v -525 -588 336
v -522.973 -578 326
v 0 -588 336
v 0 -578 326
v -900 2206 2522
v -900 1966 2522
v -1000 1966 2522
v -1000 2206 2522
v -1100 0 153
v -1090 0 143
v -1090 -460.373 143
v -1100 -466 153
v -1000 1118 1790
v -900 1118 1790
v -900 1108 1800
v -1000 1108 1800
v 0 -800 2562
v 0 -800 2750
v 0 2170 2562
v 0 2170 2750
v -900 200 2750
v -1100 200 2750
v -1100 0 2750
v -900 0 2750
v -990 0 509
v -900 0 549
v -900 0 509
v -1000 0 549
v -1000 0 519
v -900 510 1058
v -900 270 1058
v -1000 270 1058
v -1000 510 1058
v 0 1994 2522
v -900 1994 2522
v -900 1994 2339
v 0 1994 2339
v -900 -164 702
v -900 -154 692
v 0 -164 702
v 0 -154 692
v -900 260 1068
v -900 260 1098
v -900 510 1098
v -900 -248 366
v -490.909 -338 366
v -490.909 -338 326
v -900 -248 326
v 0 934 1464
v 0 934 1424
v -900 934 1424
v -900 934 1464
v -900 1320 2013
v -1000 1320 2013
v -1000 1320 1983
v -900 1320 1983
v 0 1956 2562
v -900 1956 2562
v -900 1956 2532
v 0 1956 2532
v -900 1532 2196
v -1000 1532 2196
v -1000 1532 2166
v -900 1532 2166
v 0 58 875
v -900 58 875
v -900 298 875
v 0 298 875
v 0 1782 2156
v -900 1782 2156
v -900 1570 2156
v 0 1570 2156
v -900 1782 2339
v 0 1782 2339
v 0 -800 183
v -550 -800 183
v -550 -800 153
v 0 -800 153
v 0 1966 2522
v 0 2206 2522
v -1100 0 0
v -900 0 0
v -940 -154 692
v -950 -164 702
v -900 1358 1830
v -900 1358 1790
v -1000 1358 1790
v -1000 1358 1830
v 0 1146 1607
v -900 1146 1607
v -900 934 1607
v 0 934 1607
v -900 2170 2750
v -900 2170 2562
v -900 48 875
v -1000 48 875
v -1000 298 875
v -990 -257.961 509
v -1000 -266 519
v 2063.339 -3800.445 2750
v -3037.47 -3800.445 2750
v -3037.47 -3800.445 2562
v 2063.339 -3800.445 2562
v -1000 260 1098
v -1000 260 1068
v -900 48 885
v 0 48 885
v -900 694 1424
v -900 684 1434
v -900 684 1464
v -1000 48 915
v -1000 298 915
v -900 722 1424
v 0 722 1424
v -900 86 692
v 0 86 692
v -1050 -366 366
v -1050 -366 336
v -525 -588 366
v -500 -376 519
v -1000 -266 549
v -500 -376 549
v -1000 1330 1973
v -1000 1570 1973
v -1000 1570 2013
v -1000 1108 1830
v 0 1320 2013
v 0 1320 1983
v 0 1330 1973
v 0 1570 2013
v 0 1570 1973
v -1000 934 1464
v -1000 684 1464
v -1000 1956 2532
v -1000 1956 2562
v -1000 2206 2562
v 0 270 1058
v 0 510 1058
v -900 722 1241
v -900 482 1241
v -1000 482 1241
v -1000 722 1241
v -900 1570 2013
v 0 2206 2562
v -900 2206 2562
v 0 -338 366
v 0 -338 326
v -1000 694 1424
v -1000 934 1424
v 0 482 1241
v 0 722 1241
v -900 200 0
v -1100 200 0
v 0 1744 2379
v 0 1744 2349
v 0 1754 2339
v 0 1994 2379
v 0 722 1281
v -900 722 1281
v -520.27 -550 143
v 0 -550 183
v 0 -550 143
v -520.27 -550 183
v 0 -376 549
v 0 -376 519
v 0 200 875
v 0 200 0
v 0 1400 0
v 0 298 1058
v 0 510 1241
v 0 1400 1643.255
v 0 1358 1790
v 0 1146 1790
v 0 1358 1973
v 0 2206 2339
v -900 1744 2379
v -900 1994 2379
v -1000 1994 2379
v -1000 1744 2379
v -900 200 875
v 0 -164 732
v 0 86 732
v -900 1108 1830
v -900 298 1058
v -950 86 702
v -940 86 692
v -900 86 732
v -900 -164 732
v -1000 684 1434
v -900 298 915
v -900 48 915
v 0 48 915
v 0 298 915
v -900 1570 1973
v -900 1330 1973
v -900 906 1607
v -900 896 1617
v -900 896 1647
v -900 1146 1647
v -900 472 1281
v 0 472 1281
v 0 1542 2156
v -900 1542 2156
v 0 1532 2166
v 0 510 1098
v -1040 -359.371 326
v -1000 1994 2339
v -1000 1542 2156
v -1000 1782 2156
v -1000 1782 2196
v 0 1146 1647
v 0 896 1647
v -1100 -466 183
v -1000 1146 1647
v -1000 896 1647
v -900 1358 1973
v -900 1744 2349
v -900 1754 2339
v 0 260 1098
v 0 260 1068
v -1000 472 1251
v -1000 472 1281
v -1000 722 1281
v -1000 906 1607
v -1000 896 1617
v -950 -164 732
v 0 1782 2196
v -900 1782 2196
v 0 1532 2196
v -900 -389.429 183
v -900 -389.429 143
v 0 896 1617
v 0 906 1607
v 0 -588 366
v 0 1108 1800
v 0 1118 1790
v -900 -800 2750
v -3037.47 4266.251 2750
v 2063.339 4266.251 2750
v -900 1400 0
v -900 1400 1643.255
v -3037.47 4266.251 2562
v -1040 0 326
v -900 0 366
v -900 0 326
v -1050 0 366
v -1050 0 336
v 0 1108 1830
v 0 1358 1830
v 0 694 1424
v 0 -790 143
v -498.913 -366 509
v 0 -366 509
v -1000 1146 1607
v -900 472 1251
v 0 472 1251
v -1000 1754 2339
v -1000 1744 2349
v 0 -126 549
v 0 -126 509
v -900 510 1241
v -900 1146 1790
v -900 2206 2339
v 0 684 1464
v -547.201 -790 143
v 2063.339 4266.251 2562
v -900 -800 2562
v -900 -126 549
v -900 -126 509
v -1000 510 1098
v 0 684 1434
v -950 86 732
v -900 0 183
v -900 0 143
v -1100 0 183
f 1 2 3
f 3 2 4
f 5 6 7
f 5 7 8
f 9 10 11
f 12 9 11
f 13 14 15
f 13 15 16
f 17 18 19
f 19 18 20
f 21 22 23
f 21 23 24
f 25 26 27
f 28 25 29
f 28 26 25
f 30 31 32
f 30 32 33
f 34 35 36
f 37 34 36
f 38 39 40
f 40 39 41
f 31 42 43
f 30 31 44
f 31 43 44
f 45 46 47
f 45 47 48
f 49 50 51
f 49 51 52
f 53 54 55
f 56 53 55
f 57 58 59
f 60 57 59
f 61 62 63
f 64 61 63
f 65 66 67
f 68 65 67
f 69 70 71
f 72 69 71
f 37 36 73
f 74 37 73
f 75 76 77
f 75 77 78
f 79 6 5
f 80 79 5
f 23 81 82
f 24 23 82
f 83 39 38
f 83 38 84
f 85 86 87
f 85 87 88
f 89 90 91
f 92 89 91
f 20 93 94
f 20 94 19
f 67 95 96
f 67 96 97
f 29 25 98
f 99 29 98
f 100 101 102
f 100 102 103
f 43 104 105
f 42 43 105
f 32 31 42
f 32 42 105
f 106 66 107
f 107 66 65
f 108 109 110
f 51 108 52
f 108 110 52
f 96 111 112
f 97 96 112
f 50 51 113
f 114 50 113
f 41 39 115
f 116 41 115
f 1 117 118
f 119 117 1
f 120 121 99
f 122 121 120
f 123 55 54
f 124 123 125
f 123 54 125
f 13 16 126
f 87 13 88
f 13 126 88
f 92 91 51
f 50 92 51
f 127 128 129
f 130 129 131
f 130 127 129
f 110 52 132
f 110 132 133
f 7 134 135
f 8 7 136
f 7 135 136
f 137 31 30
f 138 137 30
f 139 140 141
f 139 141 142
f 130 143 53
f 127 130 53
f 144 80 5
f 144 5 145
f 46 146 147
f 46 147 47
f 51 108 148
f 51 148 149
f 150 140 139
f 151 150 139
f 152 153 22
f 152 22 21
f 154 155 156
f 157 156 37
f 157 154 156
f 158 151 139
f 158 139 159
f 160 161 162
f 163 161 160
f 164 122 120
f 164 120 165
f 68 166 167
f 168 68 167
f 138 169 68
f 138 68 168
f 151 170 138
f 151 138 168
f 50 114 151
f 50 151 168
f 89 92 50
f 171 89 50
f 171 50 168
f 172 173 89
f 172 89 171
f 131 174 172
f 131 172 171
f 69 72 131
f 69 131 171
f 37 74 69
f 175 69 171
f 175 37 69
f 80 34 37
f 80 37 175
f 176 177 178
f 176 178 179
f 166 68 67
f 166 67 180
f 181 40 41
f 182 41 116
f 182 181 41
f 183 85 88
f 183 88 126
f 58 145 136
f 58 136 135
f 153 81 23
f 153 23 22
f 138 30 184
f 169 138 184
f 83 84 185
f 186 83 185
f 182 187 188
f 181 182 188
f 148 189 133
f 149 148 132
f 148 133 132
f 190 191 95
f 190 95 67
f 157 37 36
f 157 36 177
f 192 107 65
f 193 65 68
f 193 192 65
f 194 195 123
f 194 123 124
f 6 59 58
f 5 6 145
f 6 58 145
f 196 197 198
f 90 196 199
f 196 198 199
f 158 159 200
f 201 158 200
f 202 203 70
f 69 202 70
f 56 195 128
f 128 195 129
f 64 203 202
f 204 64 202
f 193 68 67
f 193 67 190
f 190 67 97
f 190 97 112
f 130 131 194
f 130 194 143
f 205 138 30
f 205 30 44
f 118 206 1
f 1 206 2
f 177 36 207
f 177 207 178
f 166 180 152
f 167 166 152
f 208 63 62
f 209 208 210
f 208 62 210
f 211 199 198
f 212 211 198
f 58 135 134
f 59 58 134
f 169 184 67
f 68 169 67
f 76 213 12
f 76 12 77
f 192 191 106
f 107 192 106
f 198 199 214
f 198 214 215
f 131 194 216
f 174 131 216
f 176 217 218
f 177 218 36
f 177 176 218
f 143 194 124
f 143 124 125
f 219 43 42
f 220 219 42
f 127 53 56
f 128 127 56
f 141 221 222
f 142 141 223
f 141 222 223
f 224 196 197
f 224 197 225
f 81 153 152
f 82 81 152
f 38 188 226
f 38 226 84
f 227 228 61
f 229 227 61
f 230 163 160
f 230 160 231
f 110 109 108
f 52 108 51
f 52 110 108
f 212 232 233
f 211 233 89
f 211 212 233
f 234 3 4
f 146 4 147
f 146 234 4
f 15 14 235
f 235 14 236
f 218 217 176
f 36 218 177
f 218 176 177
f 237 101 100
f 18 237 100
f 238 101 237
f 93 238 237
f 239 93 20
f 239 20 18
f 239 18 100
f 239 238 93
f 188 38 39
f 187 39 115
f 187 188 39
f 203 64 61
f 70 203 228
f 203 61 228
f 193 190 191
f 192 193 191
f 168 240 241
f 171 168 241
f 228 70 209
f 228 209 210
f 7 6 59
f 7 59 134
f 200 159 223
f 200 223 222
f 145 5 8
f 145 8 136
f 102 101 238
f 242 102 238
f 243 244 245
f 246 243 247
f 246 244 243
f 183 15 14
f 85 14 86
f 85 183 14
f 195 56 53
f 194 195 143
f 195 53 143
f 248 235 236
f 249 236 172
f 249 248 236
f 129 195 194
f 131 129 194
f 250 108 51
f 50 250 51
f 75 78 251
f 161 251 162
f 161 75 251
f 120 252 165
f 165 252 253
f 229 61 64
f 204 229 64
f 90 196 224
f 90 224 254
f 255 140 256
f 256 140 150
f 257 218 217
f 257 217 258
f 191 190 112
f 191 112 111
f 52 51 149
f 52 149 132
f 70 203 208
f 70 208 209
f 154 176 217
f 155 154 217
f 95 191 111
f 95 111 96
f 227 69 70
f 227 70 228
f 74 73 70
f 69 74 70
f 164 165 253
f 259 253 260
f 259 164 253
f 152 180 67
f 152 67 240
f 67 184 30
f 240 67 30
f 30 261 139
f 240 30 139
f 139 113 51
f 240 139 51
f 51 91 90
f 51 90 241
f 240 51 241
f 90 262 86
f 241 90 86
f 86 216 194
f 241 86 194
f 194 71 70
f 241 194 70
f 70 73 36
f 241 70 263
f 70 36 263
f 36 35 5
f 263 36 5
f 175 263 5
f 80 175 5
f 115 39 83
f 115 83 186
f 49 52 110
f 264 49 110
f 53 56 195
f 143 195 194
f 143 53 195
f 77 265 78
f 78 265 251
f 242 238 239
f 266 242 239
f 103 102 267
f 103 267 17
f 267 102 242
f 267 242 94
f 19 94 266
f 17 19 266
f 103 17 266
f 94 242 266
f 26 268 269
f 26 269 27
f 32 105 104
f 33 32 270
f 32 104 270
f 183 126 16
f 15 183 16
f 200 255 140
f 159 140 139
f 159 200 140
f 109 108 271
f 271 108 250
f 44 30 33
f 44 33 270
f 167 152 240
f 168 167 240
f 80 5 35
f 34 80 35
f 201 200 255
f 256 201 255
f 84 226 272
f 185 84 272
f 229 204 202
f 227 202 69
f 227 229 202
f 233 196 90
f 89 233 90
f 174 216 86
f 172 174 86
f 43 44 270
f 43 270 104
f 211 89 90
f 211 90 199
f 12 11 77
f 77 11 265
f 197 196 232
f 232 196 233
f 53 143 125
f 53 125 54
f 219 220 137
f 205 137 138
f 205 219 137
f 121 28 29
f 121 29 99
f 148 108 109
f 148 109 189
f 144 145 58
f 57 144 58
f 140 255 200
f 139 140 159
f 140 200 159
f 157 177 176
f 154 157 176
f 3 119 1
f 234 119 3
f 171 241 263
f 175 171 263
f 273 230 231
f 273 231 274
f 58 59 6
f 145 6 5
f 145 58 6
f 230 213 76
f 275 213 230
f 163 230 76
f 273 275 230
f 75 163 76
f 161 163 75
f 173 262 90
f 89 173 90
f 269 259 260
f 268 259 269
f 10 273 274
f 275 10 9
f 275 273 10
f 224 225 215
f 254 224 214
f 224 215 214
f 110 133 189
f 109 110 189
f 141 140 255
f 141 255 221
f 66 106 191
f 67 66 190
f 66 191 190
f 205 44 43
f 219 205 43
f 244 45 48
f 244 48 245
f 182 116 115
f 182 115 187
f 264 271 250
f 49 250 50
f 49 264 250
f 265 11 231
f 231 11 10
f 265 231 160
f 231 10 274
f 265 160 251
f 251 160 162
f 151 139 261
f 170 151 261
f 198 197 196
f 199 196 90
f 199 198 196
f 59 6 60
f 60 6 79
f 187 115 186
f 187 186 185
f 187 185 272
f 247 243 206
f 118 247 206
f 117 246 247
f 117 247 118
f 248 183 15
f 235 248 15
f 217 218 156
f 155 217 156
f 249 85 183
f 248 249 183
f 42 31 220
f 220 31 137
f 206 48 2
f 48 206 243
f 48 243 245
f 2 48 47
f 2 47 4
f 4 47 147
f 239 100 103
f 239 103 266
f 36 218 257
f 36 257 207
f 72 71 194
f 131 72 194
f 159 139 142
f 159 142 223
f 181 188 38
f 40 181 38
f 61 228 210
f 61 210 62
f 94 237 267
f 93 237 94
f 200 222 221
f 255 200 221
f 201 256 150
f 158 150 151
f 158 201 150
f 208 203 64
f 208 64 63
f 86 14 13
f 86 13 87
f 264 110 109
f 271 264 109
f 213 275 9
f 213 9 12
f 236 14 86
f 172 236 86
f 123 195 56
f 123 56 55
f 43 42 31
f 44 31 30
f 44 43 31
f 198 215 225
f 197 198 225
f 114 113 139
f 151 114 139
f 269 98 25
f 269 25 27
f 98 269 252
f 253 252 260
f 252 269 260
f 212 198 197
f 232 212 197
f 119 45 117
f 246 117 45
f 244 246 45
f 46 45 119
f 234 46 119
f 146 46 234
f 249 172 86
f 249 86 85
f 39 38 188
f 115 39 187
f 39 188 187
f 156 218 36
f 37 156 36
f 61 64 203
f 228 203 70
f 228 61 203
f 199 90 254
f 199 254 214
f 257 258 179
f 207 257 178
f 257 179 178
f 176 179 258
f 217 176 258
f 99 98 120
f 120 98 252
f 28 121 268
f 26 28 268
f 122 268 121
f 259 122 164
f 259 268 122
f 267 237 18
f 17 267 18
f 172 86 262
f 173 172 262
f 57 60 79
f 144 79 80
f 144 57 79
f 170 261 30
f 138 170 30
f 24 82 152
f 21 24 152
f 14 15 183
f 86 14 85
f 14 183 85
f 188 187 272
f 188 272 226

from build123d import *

# Parameters (mm, degrees)
F2_W        = 5100.8088588715
F2_H        = 8066.695690155
F2_W_2      = 900
F2_H_2      = 2970
F3_DEPTH    = 188
F4_W        = 200
F4_H        = 200
F5_DEPTH    = 2750
F9_DEPTH    = 900
F10_DEPTH   = 100
F12_DEPTH   = 900
F13_DEPTH   = 50
F18_DEPTH   = 40
F20_DEPTH   = 40
F22_DEPTH   = 40
F33_SIZE    = 10
F33_2_SIZE  = 10
F33_3_SIZE  = 10
F33_4_SIZE  = 10
F33_5_SIZE  = 10
F33_6_SIZE  = 10
F33_7_SIZE  = 10
F33_8_SIZE  = 10
F33_9_SIZE  = 10
F33_10_SIZE = 10
F33_11_SIZE = 10
F33_12_SIZE = 10
F33_13_SIZE = 10
F33_14_SIZE = 10
F33_15_SIZE = 10
F33_16_SIZE = 10
F33_17_SIZE = 10
F33_18_SIZE = 10
F33_19_SIZE = 10
F33_20_SIZE = 10
F33_21_SIZE = 10
F33_22_SIZE = 10
F33_23_SIZE = 10
F33_24_SIZE = 10


# Not quite as in the source:
# - the program builds the solid bodies; features that only make, move or delete a surface that nothing else refers to are left out


with BuildPart() as f3:
    # F2 (on offset) → F3 (new body)
    with BuildSketch(Plane.XY.offset(2750)):
        with Locations((-487.065911293, 232.9032421112)):
            Rectangle(F2_W, F2_H)
        with Locations((-450, 685)):
            Rectangle(F2_W_2, F2_H_2, mode=Mode.SUBTRACT)
    extrude(amount=-F3_DEPTH)


with BuildPart() as f5:
    # F4 (on Top) → F5 (new body, through all)
    with BuildSketch(Plane.XY):
        with Locations((-1000, 100)):
            Rectangle(F4_W, F4_H)
    extrude(amount=F5_DEPTH)


with BuildPart() as f9:
    # F8 (on plane+point) → F9 (new body, through all)
    with BuildSketch(Plane.YZ.offset(-900)):
        Polygon((2168, 2562), (1956, 2562), (1956, 2522), (2206, 2522), (2206, 2562), align=None)
    extrude(amount=F9_DEPTH)


with BuildPart() as f9b:
    # F8 (on plane+point) → F9, piece 2 (new body, through all)
    with BuildSketch(Plane.YZ.offset(-900)):
        Polygon((1956, 2379), (1744, 2379), (1744, 2339), (1994, 2339), (1994, 2379), align=None)
    extrude(amount=F9_DEPTH)


with BuildPart() as f9c:
    # F8 (on plane+point) → F9, piece 3 (new body, through all)
    with BuildSketch(Plane.YZ.offset(-900)):
        Polygon((1744, 2196), (1532, 2196), (1532, 2156), (1782, 2156), (1782, 2196), align=None)
    extrude(amount=F9_DEPTH)


with BuildPart() as f9d:
    # F8 (on plane+point) → F9, piece 4 (new body, through all)
    with BuildSketch(Plane.YZ.offset(-900)):
        Polygon((1532, 2013), (1320, 2013), (1320, 1973), (1570, 1973), (1570, 2013), align=None)
    extrude(amount=F9_DEPTH)


with BuildPart() as f9e:
    # F8 (on plane+point) → F9, piece 5 (new body, through all)
    with BuildSketch(Plane.YZ.offset(-900)):
        Polygon((1320, 1830), (1108, 1830), (1108, 1790), (1358, 1790), (1358, 1830), align=None)
    extrude(amount=F9_DEPTH)


with BuildPart() as f9f:
    # F8 (on plane+point) → F9, piece 6 (new body, through all)
    with BuildSketch(Plane.YZ.offset(-900)):
        Polygon((1108, 1647), (896, 1647), (896, 1607), (1146, 1607), (1146, 1647), align=None)
    extrude(amount=F9_DEPTH)


with BuildPart() as f9g:
    # F8 (on plane+point) → F9, piece 7 (new body, through all)
    with BuildSketch(Plane.YZ.offset(-900)):
        Polygon((896, 1464), (684, 1464), (684, 1424), (934, 1424), (934, 1464), align=None)
    extrude(amount=F9_DEPTH)


with BuildPart() as f9h:
    # F8 (on plane+point) → F9, piece 8 (new body, through all)
    with BuildSketch(Plane.YZ.offset(-900)):
        Polygon((684, 1281), (472, 1281), (472, 1241), (722, 1241), (722, 1281), align=None)
    extrude(amount=F9_DEPTH)


with BuildPart() as f9i:
    # F8 (on plane+point) → F9, piece 9 (new body, through all)
    with BuildSketch(Plane.YZ.offset(-900)):
        Polygon((472, 1098), (260, 1098), (260, 1058), (510, 1058), (510, 1098), align=None)
    extrude(amount=F9_DEPTH)


with BuildPart() as f9j:
    # F8 (on plane+point) → F9, piece 10 (new body, through all)
    with BuildSketch(Plane.YZ.offset(-900)):
        Polygon((260, 915), (48, 915), (48, 875), (298, 875), (298, 915), align=None)
    extrude(amount=F9_DEPTH)


with BuildPart() as f9k:
    # F8 (on plane+point) → F9, piece 11 (new body, through all)
    with BuildSketch(Plane.YZ.offset(-900)):
        Polygon((48, 732), (-164, 732), (-164, 692), (86, 692), (86, 732), align=None)
    extrude(amount=F9_DEPTH)


with BuildPart() as f10:
    # F10 (new): a face of the model
    f10_faces = [f9.part.faces().sort_by_distance(p)[0] for p in [
        (-900, 2081, 2542),
    ]]
    extrude(f10_faces, amount=F10_DEPTH)

    # F33
    f33_edges = [f10.edges().sort_by_distance(p)[0] for p in [
        (-950, 1956, 2522),
    ]]
    chamfer(f33_edges, length=F33_SIZE)


with BuildPart() as f10b:
    # F10#2 (new): a face of the model
    f10_2_faces = [f9b.part.faces().sort_by_distance(p)[0] for p in [
        (-900, 1869, 2359),
    ]]
    extrude(f10_2_faces, amount=F10_DEPTH)

    # F33#3
    f33_3_edges = [f10b.edges().sort_by_distance(p)[0] for p in [
        (-950, 1744, 2339),
    ]]
    chamfer(f33_3_edges, length=F33_3_SIZE)


with BuildPart() as f10c:
    # F10#3 (new): a face of the model
    f10_3_faces = [f9c.part.faces().sort_by_distance(p)[0] for p in [
        (-900, 1657, 2176),
    ]]
    extrude(f10_3_faces, amount=F10_DEPTH)

    # F33#5
    f33_5_edges = [f10c.edges().sort_by_distance(p)[0] for p in [
        (-950, 1532, 2156),
    ]]
    chamfer(f33_5_edges, length=F33_5_SIZE)


with BuildPart() as f10d:
    # F10#4 (new): a face of the model
    f10_4_faces = [f9d.part.faces().sort_by_distance(p)[0] for p in [
        (-900, 1445, 1993),
    ]]
    extrude(f10_4_faces, amount=F10_DEPTH)

    # F33#7
    f33_7_edges = [f10d.edges().sort_by_distance(p)[0] for p in [
        (-950, 1320, 1973),
    ]]
    chamfer(f33_7_edges, length=F33_7_SIZE)


with BuildPart() as f10e:
    # F10#5 (new): a face of the model
    f10_5_faces = [f9e.part.faces().sort_by_distance(p)[0] for p in [
        (-900, 1233, 1810),
    ]]
    extrude(f10_5_faces, amount=F10_DEPTH)

    # F33#9
    f33_9_edges = [f10e.edges().sort_by_distance(p)[0] for p in [
        (-950, 1108, 1790),
    ]]
    chamfer(f33_9_edges, length=F33_9_SIZE)


with BuildPart() as f10f:
    # F10#6 (new): a face of the model
    f10_6_faces = [f9f.part.faces().sort_by_distance(p)[0] for p in [
        (-900, 1021, 1627),
    ]]
    extrude(f10_6_faces, amount=F10_DEPTH)

    # F33#11
    f33_11_edges = [f10f.edges().sort_by_distance(p)[0] for p in [
        (-950, 896, 1607),
    ]]
    chamfer(f33_11_edges, length=F33_11_SIZE)


with BuildPart() as f10g:
    # F10#7 (new): a face of the model
    f10_7_faces = [f9g.part.faces().sort_by_distance(p)[0] for p in [
        (-900, 809, 1444),
    ]]
    extrude(f10_7_faces, amount=F10_DEPTH)

    # F33#13
    f33_13_edges = [f10g.edges().sort_by_distance(p)[0] for p in [
        (-950, 684, 1424),
    ]]
    chamfer(f33_13_edges, length=F33_13_SIZE)


with BuildPart() as f10h:
    # F10#8 (new): a face of the model
    f10_8_faces = [f9h.part.faces().sort_by_distance(p)[0] for p in [
        (-900, 597, 1261),
    ]]
    extrude(f10_8_faces, amount=F10_DEPTH)

    # F33#15
    f33_15_edges = [f10h.edges().sort_by_distance(p)[0] for p in [
        (-950, 472, 1241),
    ]]
    chamfer(f33_15_edges, length=F33_15_SIZE)


with BuildPart() as f10i:
    # F10#9 (new): a face of the model
    f10_9_faces = [f9i.part.faces().sort_by_distance(p)[0] for p in [
        (-900, 385, 1078),
    ]]
    extrude(f10_9_faces, amount=F10_DEPTH)

    # F33#17
    f33_17_edges = [f10i.edges().sort_by_distance(p)[0] for p in [
        (-950, 260, 1058),
    ]]
    chamfer(f33_17_edges, length=F33_17_SIZE)


with BuildPart() as f10j:
    # F10#10 (new): a face of the model
    f10_10_faces = [f9j.part.faces().sort_by_distance(p)[0] for p in [
        (-900, 173, 895),
    ]]
    extrude(f10_10_faces, amount=F10_DEPTH)


with BuildPart() as f12:
    # F11 (on plane+point) → F12 (new body, through all)
    with BuildSketch(Plane.YZ.offset(-900)):
        Polygon((298, 1058), (298, 915), (298, 875), (200, 875), (200, 0), (1400, 0), (1400, 1643.2547169811), (1146, 1424), (1146, 1607), (934, 1607), (934, 1464), (934, 1424), (722, 1424), (722, 1281), (722, 1241), (510, 1241), (510, 1098), (510, 1058), align=None)
        Polygon((1146, 1424), (1400, 1643.2547169811), (1400, 1973), (1358, 1973), (1358, 1830), (1358, 1790), (1146, 1790), (1146, 1647), (1146, 1607), align=None)
        Polygon((1400, 1973), (1400, 1643.2547169811), (2206, 2339), (2206, 2522), (1994, 2522), (1994, 2379), (1994, 2339), (1782, 2339), (1782, 2196), (1782, 2156), (1570, 2156), (1570, 2013), (1570, 1973), align=None)
    extrude(amount=F12_DEPTH)


with BuildPart() as f13:
    # F13 (new): a face of the model
    f13_faces = [f9k.part.faces().sort_by_distance(p)[0] for p in [
        (-900, -39, 712),
    ]]
    extrude(f13_faces, amount=F13_DEPTH)

    # F33#21
    f33_21_edges = [f13.edges().sort_by_distance(p)[0] for p in [
        (-925, -164, 692),
        (-950, -39, 692),
    ]]
    chamfer(f33_21_edges, length=F33_21_SIZE)


with BuildPart() as f18:
    # F17 (on plane+point) → F18 (new body)
    with BuildSketch(Plane.XY.offset(549)):
        Polygon((-1000, -266), (-500, -376), (0, -376), (0, -126), (-900, -126), (-900, 0), (-1000, 0), (-1000, -126), align=None)
    extrude(amount=-F18_DEPTH)

    # F33#22
    f33_22_edges = [f18.edges().sort_by_distance(p)[0] for p in [
        (-1000, -133, 509),
        (-750, -321, 509),
        (-250, -376, 509),
    ]]
    chamfer(f33_22_edges, length=F33_22_SIZE)


with BuildPart() as f20:
    # F19 (on plane+point) → F20 (new body)
    with BuildSketch(Plane.XY.offset(366)):
        Polygon((-1050, -366), (-525, -588), (0, -588), (0, -338), (-490.9090909091, -338), (-900, -248), (-900, 0), (-1050, 0), (-1050, -226), align=None)
    extrude(amount=-F20_DEPTH)

    # F33#23
    f33_23_edges = [f20.edges().sort_by_distance(p)[0] for p in [
        (-1050, -183, 326),
        (-787.5, -477, 326),
        (-262.5, -588, 326),
    ]]
    chamfer(f33_23_edges, length=F33_23_SIZE)


with BuildPart() as f22:
    # F21 (on plane+point) → F22 (new body)
    with BuildSketch(Plane.XY.offset(183)):
        Polygon((-1100, -466), (-550, -800), (0, -800), (0, -550), (-520.2702702703, -550), (-900, -389.4285714286), (-900, 0), (-1100, 0), (-1100, -326), align=None)
    extrude(amount=-F22_DEPTH)

    # F33#24
    f33_24_edges = [f22.edges().sort_by_distance(p)[0] for p in [
        (-1100, -233, 143),
        (-825, -633, 143),
        (-275, -800, 143),
    ]]
    chamfer(f33_24_edges, length=F33_24_SIZE)


with BuildPart() as f9_1:
    add(f9.part)

    # F33#2
    f33_2_edges = [f9_1.edges().sort_by_distance(p)[0] for p in [
        (-450, 1956, 2522),
    ]]
    chamfer(f33_2_edges, length=F33_2_SIZE)


with BuildPart() as f9b_1:
    add(f9b.part)

    # F33#4
    f33_4_edges = [f9b_1.edges().sort_by_distance(p)[0] for p in [
        (-450, 1744, 2339),
    ]]
    chamfer(f33_4_edges, length=F33_4_SIZE)


with BuildPart() as f9c_1:
    add(f9c.part)

    # F33#6
    f33_6_edges = [f9c_1.edges().sort_by_distance(p)[0] for p in [
        (-450, 1532, 2156),
    ]]
    chamfer(f33_6_edges, length=F33_6_SIZE)


with BuildPart() as f9d_1:
    add(f9d.part)

    # F33#8
    f33_8_edges = [f9d_1.edges().sort_by_distance(p)[0] for p in [
        (-450, 1320, 1973),
    ]]
    chamfer(f33_8_edges, length=F33_8_SIZE)


with BuildPart() as f9e_1:
    add(f9e.part)

    # F33#10
    f33_10_edges = [f9e_1.edges().sort_by_distance(p)[0] for p in [
        (-450, 1108, 1790),
    ]]
    chamfer(f33_10_edges, length=F33_10_SIZE)


with BuildPart() as f9f_1:
    add(f9f.part)

    # F33#12
    f33_12_edges = [f9f_1.edges().sort_by_distance(p)[0] for p in [
        (-450, 896, 1607),
    ]]
    chamfer(f33_12_edges, length=F33_12_SIZE)


with BuildPart() as f9g_1:
    add(f9g.part)

    # F33#14
    f33_14_edges = [f9g_1.edges().sort_by_distance(p)[0] for p in [
        (-450, 684, 1424),
    ]]
    chamfer(f33_14_edges, length=F33_14_SIZE)


with BuildPart() as f9h_1:
    add(f9h.part)

    # F33#16
    f33_16_edges = [f9h_1.edges().sort_by_distance(p)[0] for p in [
        (-450, 472, 1241),
    ]]
    chamfer(f33_16_edges, length=F33_16_SIZE)


with BuildPart() as f9i_1:
    add(f9i.part)

    # F33#18
    f33_18_edges = [f9i_1.edges().sort_by_distance(p)[0] for p in [
        (-450, 260, 1058),
    ]]
    chamfer(f33_18_edges, length=F33_18_SIZE)


with BuildPart() as f9j_1:
    add(f9j.part)

    # F33#19
    f33_19_edges = [f9j_1.edges().sort_by_distance(p)[0] for p in [
        (-450, 48, 875),
    ]]
    chamfer(f33_19_edges, length=F33_19_SIZE)


with BuildPart() as f9k_1:
    add(f9k.part)

    # F33#20
    f33_20_edges = [f9k_1.edges().sort_by_distance(p)[0] for p in [
        (-450, -164, 692),
    ]]
    chamfer(f33_20_edges, length=F33_20_SIZE)


solid = Compound([f3.part, f5.part, f10.part, f10b.part, f10c.part, f10d.part, f10e.part, f10f.part, f10g.part, f10h.part, f10i.part, f10j.part, f12.part, f13.part, f18.part, f20.part, f22.part, f9_1.part, f9b_1.part, f9c_1.part, f9d_1.part, f9e_1.part, f9f_1.part, f9g_1.part, f9h_1.part, f9i_1.part, f9j_1.part, f9k_1.part])
